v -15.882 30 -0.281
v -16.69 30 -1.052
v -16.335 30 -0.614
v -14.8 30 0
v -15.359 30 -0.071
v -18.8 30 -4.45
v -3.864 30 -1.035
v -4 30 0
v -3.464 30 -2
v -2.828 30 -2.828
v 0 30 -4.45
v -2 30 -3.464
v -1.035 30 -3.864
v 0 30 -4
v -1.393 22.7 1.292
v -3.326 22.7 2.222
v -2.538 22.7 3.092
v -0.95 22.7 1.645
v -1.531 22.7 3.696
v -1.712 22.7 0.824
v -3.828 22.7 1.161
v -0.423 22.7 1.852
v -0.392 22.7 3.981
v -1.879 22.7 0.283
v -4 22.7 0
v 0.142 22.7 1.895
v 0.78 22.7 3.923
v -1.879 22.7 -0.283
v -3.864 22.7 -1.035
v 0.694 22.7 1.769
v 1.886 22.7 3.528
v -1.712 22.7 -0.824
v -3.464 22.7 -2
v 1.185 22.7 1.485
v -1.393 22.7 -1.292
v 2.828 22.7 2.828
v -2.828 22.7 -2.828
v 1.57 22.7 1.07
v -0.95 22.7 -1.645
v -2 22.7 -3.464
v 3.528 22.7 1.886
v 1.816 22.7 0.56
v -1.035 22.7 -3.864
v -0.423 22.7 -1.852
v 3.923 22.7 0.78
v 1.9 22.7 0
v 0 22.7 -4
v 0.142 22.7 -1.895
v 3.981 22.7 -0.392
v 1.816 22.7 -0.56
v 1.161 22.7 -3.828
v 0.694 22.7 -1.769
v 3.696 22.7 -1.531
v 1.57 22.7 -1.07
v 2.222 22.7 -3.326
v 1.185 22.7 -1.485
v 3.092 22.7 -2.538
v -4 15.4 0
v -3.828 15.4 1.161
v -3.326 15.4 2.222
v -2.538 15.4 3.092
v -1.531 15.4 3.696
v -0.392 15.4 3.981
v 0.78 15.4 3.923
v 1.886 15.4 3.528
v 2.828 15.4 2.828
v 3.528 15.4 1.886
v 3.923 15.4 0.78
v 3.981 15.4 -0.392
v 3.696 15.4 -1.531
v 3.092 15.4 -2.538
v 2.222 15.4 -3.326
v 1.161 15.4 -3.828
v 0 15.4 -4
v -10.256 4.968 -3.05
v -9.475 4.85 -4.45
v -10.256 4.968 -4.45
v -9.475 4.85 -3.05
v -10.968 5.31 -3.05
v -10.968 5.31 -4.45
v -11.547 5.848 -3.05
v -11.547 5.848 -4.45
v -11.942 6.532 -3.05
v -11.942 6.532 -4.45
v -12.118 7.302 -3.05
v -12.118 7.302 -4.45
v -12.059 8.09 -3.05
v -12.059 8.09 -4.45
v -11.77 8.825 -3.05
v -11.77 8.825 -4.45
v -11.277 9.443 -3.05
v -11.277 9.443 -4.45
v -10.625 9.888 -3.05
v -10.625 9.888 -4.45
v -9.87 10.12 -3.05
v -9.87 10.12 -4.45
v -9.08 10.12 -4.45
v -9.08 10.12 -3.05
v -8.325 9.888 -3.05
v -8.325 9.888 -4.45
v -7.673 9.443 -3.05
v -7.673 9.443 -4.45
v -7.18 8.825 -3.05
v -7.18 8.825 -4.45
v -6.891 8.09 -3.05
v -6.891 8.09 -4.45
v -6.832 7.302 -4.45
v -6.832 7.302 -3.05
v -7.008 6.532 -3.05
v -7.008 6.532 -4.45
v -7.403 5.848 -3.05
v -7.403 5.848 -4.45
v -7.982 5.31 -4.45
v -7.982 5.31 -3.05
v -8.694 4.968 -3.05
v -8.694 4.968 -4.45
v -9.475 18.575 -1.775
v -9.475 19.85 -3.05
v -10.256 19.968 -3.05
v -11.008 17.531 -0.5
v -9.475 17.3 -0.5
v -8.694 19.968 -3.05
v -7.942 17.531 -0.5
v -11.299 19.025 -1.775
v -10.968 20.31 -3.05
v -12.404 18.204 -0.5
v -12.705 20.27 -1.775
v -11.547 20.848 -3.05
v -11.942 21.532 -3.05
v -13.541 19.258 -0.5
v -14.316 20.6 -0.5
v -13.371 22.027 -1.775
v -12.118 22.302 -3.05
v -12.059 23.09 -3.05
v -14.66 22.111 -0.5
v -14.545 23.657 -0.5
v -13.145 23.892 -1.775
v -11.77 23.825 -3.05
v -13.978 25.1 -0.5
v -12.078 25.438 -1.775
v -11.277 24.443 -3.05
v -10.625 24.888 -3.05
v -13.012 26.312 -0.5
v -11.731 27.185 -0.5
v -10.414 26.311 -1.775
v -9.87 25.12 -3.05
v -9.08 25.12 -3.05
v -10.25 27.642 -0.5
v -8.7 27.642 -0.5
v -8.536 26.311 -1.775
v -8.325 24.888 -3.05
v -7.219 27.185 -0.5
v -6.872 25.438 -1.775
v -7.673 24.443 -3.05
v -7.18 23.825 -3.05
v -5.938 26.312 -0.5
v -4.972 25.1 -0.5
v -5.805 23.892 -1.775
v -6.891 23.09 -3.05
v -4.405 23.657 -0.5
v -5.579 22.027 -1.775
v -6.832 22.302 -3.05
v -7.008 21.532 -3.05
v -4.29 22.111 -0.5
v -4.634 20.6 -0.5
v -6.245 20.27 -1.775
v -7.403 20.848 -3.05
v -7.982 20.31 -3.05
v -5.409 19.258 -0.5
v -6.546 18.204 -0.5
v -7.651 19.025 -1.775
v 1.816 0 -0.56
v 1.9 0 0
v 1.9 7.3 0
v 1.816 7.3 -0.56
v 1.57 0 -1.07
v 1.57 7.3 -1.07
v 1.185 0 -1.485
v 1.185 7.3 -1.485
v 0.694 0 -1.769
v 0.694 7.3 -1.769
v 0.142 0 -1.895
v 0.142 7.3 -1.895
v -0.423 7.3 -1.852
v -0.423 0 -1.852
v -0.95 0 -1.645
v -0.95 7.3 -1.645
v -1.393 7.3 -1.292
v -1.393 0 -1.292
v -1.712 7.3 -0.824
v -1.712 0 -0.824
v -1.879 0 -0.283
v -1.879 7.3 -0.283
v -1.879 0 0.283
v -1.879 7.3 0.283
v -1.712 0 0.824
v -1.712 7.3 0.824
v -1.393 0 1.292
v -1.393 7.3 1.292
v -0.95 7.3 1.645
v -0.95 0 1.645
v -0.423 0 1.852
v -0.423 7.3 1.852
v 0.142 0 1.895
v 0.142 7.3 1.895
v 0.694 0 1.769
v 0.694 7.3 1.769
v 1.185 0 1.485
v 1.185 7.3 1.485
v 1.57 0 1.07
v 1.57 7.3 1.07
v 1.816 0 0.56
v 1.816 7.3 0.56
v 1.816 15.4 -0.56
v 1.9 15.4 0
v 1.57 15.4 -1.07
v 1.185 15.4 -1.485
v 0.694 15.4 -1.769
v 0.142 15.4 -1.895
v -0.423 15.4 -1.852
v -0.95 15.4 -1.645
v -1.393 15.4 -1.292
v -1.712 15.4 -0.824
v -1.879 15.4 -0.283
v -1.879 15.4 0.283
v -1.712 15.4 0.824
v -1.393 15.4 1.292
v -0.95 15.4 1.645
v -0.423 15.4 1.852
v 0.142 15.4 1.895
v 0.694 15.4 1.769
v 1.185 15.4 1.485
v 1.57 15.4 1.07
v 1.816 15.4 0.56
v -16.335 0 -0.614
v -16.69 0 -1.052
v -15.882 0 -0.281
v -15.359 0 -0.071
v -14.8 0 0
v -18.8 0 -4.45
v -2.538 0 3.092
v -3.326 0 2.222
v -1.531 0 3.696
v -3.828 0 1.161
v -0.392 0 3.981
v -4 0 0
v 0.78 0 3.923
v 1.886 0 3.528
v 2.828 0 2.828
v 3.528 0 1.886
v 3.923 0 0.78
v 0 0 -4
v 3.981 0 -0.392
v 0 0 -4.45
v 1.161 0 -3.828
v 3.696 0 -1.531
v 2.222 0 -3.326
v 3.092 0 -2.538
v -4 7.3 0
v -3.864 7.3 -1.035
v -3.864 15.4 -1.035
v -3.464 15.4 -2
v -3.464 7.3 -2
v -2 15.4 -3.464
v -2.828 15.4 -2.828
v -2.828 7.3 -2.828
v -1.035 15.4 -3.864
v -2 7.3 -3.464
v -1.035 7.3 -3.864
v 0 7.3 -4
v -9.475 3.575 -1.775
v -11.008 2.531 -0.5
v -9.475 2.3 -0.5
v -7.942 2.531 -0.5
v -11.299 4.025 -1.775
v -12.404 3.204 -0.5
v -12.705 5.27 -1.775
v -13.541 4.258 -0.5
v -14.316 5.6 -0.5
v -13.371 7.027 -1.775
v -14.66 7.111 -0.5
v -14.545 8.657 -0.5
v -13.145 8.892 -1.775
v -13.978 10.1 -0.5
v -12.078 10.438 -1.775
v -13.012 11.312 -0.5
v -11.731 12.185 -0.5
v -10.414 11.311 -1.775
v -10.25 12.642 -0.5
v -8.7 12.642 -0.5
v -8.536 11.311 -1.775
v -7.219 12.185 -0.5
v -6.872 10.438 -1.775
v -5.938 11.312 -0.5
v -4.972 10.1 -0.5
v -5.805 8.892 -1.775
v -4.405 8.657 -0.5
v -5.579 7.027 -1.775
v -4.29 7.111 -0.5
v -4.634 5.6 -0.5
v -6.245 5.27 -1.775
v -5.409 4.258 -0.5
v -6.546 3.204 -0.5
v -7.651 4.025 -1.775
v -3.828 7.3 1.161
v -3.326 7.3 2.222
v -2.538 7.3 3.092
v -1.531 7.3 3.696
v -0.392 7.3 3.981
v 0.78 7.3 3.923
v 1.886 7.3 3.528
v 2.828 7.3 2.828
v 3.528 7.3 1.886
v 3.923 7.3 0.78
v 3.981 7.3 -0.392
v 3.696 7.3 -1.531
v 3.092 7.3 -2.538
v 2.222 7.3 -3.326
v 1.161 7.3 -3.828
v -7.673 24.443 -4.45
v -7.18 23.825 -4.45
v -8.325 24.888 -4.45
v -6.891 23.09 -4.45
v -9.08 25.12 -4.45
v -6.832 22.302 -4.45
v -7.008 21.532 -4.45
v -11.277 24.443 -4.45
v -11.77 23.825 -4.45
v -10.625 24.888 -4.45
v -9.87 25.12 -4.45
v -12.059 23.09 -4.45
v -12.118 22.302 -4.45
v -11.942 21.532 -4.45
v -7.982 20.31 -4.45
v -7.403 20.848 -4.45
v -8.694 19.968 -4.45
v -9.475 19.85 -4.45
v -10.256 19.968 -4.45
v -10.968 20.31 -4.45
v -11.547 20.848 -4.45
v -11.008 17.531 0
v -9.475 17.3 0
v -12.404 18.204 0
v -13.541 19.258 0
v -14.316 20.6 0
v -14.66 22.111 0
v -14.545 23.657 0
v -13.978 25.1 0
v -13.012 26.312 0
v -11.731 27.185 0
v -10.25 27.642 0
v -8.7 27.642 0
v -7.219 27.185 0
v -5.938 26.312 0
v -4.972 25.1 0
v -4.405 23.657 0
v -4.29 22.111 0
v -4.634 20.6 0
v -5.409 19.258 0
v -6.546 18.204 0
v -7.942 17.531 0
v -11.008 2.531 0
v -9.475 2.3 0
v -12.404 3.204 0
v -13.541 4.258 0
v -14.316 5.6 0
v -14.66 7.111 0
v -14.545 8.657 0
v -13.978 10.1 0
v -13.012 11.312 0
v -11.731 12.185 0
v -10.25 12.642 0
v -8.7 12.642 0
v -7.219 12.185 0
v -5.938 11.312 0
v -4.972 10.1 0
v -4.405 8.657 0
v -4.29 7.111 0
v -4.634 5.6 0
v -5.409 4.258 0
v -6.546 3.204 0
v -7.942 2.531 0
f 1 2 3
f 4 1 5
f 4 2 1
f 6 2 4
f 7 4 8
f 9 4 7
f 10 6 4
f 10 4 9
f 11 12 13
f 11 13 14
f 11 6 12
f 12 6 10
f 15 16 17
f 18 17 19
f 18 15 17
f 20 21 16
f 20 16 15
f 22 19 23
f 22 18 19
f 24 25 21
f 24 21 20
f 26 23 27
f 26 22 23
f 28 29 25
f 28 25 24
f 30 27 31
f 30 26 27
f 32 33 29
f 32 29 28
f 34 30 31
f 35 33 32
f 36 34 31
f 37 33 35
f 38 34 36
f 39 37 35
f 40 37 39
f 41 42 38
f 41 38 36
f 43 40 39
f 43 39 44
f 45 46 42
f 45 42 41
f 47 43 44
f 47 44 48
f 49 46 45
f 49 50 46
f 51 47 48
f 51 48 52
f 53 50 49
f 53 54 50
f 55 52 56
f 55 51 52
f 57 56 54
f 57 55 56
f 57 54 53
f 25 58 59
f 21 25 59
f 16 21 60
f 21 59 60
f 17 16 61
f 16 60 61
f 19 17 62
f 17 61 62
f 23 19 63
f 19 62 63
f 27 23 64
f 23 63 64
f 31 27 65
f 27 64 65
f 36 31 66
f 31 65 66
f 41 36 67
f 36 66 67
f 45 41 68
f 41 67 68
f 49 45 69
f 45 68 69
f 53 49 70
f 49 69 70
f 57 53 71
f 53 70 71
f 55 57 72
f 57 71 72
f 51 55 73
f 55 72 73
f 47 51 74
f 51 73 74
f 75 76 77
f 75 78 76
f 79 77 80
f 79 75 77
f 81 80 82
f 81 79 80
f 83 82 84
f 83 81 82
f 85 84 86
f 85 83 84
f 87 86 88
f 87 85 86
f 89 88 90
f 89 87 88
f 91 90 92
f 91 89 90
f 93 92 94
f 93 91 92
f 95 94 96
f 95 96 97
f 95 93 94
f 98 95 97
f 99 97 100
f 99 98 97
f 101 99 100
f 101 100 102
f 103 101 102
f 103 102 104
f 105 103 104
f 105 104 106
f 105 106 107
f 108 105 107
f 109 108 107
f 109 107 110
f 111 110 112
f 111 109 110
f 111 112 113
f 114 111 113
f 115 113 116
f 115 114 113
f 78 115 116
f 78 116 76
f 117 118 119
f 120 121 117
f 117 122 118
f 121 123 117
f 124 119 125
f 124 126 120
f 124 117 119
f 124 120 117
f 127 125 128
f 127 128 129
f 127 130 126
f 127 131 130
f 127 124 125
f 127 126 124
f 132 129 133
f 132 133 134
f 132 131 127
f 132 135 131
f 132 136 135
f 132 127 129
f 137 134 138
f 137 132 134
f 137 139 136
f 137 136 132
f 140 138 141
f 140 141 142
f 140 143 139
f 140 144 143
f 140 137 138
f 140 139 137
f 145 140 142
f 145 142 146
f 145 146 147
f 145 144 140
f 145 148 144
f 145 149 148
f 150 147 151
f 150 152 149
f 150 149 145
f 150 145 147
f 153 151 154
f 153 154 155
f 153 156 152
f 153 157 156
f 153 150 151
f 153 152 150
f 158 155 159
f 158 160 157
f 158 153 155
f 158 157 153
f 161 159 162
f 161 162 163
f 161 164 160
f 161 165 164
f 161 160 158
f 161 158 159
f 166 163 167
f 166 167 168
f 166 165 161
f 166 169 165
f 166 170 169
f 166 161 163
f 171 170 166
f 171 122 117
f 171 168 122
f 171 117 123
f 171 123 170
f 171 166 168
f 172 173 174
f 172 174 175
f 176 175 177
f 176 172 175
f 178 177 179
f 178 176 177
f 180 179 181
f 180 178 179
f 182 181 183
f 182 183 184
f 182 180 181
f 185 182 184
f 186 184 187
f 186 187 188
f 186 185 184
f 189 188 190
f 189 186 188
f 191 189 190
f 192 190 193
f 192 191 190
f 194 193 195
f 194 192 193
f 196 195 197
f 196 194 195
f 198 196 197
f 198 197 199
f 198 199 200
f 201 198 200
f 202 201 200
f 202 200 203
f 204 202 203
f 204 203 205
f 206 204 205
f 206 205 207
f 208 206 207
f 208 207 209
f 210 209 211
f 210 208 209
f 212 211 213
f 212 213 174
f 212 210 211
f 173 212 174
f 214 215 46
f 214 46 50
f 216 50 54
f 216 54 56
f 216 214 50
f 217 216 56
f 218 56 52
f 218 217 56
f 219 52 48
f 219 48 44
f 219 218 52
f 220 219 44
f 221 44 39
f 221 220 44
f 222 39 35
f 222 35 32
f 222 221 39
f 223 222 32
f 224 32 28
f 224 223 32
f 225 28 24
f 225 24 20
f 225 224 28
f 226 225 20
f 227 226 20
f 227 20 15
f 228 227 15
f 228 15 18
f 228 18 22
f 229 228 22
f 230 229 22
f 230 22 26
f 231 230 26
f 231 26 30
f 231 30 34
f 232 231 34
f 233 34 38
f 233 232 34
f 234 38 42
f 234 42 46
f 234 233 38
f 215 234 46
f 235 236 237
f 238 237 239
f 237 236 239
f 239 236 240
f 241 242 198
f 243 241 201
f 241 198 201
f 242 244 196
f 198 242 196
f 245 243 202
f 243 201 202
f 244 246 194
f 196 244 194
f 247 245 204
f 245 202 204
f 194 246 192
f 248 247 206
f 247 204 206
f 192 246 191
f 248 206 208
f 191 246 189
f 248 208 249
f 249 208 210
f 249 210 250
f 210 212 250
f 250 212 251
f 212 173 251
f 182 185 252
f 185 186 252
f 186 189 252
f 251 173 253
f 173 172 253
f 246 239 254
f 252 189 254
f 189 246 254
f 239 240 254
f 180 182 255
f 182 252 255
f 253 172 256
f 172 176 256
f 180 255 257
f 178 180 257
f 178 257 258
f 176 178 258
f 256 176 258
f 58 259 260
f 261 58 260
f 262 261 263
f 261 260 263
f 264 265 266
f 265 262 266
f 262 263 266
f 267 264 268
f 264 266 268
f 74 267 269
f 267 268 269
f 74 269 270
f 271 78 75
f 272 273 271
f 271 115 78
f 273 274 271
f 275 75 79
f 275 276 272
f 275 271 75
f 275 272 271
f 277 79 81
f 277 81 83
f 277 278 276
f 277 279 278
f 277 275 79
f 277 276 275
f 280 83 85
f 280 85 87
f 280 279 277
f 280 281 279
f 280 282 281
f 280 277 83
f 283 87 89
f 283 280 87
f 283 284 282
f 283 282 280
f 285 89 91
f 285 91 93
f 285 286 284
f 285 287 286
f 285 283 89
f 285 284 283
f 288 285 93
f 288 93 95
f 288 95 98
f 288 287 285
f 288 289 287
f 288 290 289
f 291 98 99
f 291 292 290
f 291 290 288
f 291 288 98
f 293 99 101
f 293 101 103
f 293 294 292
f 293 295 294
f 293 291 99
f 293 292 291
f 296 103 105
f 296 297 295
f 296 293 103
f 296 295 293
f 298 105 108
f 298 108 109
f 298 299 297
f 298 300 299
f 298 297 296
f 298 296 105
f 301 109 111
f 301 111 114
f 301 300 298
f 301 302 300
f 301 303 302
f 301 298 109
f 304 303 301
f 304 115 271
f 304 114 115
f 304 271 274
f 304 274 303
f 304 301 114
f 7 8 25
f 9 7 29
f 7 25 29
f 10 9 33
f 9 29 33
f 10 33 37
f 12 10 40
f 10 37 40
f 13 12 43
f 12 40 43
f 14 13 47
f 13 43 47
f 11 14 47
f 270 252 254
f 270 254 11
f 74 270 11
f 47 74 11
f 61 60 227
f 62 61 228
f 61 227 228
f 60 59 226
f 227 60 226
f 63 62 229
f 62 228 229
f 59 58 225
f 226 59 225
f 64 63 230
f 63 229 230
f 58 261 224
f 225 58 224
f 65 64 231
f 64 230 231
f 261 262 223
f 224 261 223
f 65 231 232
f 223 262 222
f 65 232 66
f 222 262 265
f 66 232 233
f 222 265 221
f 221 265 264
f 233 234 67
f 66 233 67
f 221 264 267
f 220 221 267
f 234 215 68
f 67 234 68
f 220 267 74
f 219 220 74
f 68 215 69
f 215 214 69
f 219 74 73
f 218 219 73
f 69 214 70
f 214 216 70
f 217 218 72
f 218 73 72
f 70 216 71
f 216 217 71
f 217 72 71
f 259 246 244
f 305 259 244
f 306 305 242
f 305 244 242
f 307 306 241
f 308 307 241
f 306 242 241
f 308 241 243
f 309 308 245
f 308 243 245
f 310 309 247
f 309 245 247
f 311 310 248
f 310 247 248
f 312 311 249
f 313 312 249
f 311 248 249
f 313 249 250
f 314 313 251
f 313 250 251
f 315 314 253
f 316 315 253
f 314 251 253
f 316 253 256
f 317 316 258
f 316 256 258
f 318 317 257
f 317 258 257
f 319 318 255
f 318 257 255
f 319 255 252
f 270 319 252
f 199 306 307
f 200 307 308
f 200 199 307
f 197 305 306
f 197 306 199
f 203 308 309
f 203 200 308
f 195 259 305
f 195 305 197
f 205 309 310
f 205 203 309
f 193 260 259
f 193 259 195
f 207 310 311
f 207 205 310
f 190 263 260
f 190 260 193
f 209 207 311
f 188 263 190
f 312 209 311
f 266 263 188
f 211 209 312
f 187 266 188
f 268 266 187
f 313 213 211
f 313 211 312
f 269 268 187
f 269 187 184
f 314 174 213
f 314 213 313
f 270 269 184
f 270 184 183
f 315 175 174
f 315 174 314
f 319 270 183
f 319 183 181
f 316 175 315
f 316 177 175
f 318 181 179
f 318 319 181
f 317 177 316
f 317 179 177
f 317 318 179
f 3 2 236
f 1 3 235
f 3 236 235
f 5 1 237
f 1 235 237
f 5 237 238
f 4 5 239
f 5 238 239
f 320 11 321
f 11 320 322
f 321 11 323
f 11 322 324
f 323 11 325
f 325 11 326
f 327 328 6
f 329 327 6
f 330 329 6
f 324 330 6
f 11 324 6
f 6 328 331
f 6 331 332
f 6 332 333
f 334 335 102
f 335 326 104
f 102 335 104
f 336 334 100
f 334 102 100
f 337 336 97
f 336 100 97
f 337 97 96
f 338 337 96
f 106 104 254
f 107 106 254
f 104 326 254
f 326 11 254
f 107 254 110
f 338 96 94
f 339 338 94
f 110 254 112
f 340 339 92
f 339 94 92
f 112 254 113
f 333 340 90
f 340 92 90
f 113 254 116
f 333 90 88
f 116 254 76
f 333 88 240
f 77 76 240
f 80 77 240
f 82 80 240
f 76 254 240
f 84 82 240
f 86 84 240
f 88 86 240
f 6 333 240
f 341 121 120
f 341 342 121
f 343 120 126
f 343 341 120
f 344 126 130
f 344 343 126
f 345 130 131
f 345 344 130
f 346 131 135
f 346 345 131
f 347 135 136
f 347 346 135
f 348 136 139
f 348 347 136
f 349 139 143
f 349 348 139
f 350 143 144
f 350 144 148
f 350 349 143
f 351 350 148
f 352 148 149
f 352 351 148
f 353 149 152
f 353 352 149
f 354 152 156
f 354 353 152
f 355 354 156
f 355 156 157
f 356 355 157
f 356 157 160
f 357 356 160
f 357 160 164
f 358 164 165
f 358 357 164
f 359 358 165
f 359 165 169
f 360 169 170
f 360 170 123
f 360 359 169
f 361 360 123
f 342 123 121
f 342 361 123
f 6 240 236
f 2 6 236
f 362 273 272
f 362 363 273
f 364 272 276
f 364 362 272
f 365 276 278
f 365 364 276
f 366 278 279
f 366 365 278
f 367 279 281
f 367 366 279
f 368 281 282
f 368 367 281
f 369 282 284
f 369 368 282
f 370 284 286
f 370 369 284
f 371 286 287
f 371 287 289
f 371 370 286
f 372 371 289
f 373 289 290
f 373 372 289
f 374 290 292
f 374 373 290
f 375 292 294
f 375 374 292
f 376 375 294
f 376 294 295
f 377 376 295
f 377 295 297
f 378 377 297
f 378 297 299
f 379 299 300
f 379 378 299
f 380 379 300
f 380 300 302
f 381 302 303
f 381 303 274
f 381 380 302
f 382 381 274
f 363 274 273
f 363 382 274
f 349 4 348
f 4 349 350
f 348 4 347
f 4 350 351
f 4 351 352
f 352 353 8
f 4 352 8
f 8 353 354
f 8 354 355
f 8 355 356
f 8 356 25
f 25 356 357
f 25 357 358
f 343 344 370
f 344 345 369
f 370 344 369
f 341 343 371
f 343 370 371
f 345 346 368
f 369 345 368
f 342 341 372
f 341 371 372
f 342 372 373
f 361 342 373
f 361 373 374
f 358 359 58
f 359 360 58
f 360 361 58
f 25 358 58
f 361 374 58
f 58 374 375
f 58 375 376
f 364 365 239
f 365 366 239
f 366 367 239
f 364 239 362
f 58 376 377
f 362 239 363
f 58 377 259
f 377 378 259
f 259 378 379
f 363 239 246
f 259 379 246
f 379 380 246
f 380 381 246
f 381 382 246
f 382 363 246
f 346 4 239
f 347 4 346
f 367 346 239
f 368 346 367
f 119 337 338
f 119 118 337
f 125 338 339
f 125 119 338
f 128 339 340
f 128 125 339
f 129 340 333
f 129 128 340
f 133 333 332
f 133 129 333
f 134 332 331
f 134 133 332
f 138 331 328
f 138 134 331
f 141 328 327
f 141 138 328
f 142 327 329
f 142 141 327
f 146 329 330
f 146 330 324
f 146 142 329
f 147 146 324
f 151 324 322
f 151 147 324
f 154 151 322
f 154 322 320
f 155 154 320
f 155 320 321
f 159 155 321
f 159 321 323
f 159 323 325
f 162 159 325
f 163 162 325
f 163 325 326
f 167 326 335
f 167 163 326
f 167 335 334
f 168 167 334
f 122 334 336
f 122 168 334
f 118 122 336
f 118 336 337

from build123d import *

# Parameters (mm, degrees)
SKETCH1_R                                    = 1.9
BOSS_EXTRUDE1_DEPTH                          = 7.3
BOSS_EXTRUDE2_DEPTH                          = 30
BOSS_EXTRUDE5_START                          = 15.4
SKETCH1_7_R                                  = 1.9
BOSS_EXTRUDE5_DEPTH                          = 7.3
CSK_FOR_M5_COUNTERSUNK_FLAT_HEAD_SCR_2_COUNT = 2
CSK_FOR_M5_COUNTERSUNK_FLAT_HEAD_SCR_2_PITCH = 15


with BuildPart() as part:
    # Sketch1 → Boss-Extrude1 (new body)
    with BuildSketch(Plane(origin=(0, 0, 0), x_dir=(1, 0, 0), z_dir=(0, 1, 0))):
        with BuildLine():
            Line((0, 4), (0, 4.45))
            Line((0, 4.45), (-18.8, 4.45))
            Line((-18.8, 4.45), (-16.690397065, 1.051533367))
            ThreePointArc((-16.690397065, 1.051533367), (-15.8815872, 0.280573573), (-14.8, 0))
            Line((-14.8, 0), (-4, 0))
            ThreePointArc((-4, 0), (2.828427125, -2.828427125), (0, 4))
        make_face()
        Circle(SKETCH1_R, mode=Mode.SUBTRACT)
    extrude(amount=BOSS_EXTRUDE1_DEPTH)

    # Sketch1<3> → Boss-Extrude2 (add)
    with BuildSketch(Plane(origin=(0, 0, 0), x_dir=(1, 0, 0), z_dir=(0, 1, 0))):
        with BuildLine():
            Line((0, 4), (0, 4.45))
            Line((0, 4.45), (-18.8, 4.45))
            Line((-18.8, 4.45), (-16.690397065, 1.051533367))
            ThreePointArc((-16.690397065, 1.051533367), (-15.8815872, 0.280573573), (-14.8, 0))
            Line((-14.8, 0), (-4, 0))
            ThreePointArc((-4, 0), (-2.828427125, 2.828427125), (0, 4))
        make_face()
    extrude(amount=BOSS_EXTRUDE2_DEPTH)

    # Sketch1<7> → Boss-Extrude5 (add)
    with BuildSketch(Plane(origin=(0, 0, 0), x_dir=(1, 0, 0), z_dir=(0, 1, 0)).offset(BOSS_EXTRUDE5_START)):
        with BuildLine():
            ThreePointArc((4, 0), (2.828427125, 2.828427125), (0, 4))
            ThreePointArc((0, 4), (-2.828427125, 2.828427125), (-4, 0))
            ThreePointArc((-4, 0), (0, -4), (4, 0))
        make_face()
        Circle(SKETCH1_7_R, mode=Mode.SUBTRACT)
    extrude(amount=BOSS_EXTRUDE5_DEPTH)

    # Sketch3 → CSK for M5 Countersunk Flat Head Screw1 (revolve, cut)
    with BuildSketch(Plane(origin=(-9.475, 22.5, 0), x_dir=(0, -1, 0), z_dir=(1, 0, 0))):
        Polygon((0, 0), (0, 4.45), (2.65, 4.45), (2.65, 3.05), (5.2, 0.5), (5.2, 0), align=None)
    csk_for_m5_countersunk_flat_head_screw1 = revolve(axis=Axis((-9.475, 22.5, 6.35), (0, 0, -1)), mode=Mode.SUBTRACT)

    # CSK for M5 Countersunk Flat Head Scr 2: CSK for M5 Countersunk Flat Head Screw1 ×2
    with Locations(*[(0, -i * CSK_FOR_M5_COUNTERSUNK_FLAT_HEAD_SCR_2_PITCH, 0) for i in range(1, CSK_FOR_M5_COUNTERSUNK_FLAT_HEAD_SCR_2_COUNT)]):
        add(csk_for_m5_countersunk_flat_head_screw1, mode=Mode.SUBTRACT)


solid = part.part
